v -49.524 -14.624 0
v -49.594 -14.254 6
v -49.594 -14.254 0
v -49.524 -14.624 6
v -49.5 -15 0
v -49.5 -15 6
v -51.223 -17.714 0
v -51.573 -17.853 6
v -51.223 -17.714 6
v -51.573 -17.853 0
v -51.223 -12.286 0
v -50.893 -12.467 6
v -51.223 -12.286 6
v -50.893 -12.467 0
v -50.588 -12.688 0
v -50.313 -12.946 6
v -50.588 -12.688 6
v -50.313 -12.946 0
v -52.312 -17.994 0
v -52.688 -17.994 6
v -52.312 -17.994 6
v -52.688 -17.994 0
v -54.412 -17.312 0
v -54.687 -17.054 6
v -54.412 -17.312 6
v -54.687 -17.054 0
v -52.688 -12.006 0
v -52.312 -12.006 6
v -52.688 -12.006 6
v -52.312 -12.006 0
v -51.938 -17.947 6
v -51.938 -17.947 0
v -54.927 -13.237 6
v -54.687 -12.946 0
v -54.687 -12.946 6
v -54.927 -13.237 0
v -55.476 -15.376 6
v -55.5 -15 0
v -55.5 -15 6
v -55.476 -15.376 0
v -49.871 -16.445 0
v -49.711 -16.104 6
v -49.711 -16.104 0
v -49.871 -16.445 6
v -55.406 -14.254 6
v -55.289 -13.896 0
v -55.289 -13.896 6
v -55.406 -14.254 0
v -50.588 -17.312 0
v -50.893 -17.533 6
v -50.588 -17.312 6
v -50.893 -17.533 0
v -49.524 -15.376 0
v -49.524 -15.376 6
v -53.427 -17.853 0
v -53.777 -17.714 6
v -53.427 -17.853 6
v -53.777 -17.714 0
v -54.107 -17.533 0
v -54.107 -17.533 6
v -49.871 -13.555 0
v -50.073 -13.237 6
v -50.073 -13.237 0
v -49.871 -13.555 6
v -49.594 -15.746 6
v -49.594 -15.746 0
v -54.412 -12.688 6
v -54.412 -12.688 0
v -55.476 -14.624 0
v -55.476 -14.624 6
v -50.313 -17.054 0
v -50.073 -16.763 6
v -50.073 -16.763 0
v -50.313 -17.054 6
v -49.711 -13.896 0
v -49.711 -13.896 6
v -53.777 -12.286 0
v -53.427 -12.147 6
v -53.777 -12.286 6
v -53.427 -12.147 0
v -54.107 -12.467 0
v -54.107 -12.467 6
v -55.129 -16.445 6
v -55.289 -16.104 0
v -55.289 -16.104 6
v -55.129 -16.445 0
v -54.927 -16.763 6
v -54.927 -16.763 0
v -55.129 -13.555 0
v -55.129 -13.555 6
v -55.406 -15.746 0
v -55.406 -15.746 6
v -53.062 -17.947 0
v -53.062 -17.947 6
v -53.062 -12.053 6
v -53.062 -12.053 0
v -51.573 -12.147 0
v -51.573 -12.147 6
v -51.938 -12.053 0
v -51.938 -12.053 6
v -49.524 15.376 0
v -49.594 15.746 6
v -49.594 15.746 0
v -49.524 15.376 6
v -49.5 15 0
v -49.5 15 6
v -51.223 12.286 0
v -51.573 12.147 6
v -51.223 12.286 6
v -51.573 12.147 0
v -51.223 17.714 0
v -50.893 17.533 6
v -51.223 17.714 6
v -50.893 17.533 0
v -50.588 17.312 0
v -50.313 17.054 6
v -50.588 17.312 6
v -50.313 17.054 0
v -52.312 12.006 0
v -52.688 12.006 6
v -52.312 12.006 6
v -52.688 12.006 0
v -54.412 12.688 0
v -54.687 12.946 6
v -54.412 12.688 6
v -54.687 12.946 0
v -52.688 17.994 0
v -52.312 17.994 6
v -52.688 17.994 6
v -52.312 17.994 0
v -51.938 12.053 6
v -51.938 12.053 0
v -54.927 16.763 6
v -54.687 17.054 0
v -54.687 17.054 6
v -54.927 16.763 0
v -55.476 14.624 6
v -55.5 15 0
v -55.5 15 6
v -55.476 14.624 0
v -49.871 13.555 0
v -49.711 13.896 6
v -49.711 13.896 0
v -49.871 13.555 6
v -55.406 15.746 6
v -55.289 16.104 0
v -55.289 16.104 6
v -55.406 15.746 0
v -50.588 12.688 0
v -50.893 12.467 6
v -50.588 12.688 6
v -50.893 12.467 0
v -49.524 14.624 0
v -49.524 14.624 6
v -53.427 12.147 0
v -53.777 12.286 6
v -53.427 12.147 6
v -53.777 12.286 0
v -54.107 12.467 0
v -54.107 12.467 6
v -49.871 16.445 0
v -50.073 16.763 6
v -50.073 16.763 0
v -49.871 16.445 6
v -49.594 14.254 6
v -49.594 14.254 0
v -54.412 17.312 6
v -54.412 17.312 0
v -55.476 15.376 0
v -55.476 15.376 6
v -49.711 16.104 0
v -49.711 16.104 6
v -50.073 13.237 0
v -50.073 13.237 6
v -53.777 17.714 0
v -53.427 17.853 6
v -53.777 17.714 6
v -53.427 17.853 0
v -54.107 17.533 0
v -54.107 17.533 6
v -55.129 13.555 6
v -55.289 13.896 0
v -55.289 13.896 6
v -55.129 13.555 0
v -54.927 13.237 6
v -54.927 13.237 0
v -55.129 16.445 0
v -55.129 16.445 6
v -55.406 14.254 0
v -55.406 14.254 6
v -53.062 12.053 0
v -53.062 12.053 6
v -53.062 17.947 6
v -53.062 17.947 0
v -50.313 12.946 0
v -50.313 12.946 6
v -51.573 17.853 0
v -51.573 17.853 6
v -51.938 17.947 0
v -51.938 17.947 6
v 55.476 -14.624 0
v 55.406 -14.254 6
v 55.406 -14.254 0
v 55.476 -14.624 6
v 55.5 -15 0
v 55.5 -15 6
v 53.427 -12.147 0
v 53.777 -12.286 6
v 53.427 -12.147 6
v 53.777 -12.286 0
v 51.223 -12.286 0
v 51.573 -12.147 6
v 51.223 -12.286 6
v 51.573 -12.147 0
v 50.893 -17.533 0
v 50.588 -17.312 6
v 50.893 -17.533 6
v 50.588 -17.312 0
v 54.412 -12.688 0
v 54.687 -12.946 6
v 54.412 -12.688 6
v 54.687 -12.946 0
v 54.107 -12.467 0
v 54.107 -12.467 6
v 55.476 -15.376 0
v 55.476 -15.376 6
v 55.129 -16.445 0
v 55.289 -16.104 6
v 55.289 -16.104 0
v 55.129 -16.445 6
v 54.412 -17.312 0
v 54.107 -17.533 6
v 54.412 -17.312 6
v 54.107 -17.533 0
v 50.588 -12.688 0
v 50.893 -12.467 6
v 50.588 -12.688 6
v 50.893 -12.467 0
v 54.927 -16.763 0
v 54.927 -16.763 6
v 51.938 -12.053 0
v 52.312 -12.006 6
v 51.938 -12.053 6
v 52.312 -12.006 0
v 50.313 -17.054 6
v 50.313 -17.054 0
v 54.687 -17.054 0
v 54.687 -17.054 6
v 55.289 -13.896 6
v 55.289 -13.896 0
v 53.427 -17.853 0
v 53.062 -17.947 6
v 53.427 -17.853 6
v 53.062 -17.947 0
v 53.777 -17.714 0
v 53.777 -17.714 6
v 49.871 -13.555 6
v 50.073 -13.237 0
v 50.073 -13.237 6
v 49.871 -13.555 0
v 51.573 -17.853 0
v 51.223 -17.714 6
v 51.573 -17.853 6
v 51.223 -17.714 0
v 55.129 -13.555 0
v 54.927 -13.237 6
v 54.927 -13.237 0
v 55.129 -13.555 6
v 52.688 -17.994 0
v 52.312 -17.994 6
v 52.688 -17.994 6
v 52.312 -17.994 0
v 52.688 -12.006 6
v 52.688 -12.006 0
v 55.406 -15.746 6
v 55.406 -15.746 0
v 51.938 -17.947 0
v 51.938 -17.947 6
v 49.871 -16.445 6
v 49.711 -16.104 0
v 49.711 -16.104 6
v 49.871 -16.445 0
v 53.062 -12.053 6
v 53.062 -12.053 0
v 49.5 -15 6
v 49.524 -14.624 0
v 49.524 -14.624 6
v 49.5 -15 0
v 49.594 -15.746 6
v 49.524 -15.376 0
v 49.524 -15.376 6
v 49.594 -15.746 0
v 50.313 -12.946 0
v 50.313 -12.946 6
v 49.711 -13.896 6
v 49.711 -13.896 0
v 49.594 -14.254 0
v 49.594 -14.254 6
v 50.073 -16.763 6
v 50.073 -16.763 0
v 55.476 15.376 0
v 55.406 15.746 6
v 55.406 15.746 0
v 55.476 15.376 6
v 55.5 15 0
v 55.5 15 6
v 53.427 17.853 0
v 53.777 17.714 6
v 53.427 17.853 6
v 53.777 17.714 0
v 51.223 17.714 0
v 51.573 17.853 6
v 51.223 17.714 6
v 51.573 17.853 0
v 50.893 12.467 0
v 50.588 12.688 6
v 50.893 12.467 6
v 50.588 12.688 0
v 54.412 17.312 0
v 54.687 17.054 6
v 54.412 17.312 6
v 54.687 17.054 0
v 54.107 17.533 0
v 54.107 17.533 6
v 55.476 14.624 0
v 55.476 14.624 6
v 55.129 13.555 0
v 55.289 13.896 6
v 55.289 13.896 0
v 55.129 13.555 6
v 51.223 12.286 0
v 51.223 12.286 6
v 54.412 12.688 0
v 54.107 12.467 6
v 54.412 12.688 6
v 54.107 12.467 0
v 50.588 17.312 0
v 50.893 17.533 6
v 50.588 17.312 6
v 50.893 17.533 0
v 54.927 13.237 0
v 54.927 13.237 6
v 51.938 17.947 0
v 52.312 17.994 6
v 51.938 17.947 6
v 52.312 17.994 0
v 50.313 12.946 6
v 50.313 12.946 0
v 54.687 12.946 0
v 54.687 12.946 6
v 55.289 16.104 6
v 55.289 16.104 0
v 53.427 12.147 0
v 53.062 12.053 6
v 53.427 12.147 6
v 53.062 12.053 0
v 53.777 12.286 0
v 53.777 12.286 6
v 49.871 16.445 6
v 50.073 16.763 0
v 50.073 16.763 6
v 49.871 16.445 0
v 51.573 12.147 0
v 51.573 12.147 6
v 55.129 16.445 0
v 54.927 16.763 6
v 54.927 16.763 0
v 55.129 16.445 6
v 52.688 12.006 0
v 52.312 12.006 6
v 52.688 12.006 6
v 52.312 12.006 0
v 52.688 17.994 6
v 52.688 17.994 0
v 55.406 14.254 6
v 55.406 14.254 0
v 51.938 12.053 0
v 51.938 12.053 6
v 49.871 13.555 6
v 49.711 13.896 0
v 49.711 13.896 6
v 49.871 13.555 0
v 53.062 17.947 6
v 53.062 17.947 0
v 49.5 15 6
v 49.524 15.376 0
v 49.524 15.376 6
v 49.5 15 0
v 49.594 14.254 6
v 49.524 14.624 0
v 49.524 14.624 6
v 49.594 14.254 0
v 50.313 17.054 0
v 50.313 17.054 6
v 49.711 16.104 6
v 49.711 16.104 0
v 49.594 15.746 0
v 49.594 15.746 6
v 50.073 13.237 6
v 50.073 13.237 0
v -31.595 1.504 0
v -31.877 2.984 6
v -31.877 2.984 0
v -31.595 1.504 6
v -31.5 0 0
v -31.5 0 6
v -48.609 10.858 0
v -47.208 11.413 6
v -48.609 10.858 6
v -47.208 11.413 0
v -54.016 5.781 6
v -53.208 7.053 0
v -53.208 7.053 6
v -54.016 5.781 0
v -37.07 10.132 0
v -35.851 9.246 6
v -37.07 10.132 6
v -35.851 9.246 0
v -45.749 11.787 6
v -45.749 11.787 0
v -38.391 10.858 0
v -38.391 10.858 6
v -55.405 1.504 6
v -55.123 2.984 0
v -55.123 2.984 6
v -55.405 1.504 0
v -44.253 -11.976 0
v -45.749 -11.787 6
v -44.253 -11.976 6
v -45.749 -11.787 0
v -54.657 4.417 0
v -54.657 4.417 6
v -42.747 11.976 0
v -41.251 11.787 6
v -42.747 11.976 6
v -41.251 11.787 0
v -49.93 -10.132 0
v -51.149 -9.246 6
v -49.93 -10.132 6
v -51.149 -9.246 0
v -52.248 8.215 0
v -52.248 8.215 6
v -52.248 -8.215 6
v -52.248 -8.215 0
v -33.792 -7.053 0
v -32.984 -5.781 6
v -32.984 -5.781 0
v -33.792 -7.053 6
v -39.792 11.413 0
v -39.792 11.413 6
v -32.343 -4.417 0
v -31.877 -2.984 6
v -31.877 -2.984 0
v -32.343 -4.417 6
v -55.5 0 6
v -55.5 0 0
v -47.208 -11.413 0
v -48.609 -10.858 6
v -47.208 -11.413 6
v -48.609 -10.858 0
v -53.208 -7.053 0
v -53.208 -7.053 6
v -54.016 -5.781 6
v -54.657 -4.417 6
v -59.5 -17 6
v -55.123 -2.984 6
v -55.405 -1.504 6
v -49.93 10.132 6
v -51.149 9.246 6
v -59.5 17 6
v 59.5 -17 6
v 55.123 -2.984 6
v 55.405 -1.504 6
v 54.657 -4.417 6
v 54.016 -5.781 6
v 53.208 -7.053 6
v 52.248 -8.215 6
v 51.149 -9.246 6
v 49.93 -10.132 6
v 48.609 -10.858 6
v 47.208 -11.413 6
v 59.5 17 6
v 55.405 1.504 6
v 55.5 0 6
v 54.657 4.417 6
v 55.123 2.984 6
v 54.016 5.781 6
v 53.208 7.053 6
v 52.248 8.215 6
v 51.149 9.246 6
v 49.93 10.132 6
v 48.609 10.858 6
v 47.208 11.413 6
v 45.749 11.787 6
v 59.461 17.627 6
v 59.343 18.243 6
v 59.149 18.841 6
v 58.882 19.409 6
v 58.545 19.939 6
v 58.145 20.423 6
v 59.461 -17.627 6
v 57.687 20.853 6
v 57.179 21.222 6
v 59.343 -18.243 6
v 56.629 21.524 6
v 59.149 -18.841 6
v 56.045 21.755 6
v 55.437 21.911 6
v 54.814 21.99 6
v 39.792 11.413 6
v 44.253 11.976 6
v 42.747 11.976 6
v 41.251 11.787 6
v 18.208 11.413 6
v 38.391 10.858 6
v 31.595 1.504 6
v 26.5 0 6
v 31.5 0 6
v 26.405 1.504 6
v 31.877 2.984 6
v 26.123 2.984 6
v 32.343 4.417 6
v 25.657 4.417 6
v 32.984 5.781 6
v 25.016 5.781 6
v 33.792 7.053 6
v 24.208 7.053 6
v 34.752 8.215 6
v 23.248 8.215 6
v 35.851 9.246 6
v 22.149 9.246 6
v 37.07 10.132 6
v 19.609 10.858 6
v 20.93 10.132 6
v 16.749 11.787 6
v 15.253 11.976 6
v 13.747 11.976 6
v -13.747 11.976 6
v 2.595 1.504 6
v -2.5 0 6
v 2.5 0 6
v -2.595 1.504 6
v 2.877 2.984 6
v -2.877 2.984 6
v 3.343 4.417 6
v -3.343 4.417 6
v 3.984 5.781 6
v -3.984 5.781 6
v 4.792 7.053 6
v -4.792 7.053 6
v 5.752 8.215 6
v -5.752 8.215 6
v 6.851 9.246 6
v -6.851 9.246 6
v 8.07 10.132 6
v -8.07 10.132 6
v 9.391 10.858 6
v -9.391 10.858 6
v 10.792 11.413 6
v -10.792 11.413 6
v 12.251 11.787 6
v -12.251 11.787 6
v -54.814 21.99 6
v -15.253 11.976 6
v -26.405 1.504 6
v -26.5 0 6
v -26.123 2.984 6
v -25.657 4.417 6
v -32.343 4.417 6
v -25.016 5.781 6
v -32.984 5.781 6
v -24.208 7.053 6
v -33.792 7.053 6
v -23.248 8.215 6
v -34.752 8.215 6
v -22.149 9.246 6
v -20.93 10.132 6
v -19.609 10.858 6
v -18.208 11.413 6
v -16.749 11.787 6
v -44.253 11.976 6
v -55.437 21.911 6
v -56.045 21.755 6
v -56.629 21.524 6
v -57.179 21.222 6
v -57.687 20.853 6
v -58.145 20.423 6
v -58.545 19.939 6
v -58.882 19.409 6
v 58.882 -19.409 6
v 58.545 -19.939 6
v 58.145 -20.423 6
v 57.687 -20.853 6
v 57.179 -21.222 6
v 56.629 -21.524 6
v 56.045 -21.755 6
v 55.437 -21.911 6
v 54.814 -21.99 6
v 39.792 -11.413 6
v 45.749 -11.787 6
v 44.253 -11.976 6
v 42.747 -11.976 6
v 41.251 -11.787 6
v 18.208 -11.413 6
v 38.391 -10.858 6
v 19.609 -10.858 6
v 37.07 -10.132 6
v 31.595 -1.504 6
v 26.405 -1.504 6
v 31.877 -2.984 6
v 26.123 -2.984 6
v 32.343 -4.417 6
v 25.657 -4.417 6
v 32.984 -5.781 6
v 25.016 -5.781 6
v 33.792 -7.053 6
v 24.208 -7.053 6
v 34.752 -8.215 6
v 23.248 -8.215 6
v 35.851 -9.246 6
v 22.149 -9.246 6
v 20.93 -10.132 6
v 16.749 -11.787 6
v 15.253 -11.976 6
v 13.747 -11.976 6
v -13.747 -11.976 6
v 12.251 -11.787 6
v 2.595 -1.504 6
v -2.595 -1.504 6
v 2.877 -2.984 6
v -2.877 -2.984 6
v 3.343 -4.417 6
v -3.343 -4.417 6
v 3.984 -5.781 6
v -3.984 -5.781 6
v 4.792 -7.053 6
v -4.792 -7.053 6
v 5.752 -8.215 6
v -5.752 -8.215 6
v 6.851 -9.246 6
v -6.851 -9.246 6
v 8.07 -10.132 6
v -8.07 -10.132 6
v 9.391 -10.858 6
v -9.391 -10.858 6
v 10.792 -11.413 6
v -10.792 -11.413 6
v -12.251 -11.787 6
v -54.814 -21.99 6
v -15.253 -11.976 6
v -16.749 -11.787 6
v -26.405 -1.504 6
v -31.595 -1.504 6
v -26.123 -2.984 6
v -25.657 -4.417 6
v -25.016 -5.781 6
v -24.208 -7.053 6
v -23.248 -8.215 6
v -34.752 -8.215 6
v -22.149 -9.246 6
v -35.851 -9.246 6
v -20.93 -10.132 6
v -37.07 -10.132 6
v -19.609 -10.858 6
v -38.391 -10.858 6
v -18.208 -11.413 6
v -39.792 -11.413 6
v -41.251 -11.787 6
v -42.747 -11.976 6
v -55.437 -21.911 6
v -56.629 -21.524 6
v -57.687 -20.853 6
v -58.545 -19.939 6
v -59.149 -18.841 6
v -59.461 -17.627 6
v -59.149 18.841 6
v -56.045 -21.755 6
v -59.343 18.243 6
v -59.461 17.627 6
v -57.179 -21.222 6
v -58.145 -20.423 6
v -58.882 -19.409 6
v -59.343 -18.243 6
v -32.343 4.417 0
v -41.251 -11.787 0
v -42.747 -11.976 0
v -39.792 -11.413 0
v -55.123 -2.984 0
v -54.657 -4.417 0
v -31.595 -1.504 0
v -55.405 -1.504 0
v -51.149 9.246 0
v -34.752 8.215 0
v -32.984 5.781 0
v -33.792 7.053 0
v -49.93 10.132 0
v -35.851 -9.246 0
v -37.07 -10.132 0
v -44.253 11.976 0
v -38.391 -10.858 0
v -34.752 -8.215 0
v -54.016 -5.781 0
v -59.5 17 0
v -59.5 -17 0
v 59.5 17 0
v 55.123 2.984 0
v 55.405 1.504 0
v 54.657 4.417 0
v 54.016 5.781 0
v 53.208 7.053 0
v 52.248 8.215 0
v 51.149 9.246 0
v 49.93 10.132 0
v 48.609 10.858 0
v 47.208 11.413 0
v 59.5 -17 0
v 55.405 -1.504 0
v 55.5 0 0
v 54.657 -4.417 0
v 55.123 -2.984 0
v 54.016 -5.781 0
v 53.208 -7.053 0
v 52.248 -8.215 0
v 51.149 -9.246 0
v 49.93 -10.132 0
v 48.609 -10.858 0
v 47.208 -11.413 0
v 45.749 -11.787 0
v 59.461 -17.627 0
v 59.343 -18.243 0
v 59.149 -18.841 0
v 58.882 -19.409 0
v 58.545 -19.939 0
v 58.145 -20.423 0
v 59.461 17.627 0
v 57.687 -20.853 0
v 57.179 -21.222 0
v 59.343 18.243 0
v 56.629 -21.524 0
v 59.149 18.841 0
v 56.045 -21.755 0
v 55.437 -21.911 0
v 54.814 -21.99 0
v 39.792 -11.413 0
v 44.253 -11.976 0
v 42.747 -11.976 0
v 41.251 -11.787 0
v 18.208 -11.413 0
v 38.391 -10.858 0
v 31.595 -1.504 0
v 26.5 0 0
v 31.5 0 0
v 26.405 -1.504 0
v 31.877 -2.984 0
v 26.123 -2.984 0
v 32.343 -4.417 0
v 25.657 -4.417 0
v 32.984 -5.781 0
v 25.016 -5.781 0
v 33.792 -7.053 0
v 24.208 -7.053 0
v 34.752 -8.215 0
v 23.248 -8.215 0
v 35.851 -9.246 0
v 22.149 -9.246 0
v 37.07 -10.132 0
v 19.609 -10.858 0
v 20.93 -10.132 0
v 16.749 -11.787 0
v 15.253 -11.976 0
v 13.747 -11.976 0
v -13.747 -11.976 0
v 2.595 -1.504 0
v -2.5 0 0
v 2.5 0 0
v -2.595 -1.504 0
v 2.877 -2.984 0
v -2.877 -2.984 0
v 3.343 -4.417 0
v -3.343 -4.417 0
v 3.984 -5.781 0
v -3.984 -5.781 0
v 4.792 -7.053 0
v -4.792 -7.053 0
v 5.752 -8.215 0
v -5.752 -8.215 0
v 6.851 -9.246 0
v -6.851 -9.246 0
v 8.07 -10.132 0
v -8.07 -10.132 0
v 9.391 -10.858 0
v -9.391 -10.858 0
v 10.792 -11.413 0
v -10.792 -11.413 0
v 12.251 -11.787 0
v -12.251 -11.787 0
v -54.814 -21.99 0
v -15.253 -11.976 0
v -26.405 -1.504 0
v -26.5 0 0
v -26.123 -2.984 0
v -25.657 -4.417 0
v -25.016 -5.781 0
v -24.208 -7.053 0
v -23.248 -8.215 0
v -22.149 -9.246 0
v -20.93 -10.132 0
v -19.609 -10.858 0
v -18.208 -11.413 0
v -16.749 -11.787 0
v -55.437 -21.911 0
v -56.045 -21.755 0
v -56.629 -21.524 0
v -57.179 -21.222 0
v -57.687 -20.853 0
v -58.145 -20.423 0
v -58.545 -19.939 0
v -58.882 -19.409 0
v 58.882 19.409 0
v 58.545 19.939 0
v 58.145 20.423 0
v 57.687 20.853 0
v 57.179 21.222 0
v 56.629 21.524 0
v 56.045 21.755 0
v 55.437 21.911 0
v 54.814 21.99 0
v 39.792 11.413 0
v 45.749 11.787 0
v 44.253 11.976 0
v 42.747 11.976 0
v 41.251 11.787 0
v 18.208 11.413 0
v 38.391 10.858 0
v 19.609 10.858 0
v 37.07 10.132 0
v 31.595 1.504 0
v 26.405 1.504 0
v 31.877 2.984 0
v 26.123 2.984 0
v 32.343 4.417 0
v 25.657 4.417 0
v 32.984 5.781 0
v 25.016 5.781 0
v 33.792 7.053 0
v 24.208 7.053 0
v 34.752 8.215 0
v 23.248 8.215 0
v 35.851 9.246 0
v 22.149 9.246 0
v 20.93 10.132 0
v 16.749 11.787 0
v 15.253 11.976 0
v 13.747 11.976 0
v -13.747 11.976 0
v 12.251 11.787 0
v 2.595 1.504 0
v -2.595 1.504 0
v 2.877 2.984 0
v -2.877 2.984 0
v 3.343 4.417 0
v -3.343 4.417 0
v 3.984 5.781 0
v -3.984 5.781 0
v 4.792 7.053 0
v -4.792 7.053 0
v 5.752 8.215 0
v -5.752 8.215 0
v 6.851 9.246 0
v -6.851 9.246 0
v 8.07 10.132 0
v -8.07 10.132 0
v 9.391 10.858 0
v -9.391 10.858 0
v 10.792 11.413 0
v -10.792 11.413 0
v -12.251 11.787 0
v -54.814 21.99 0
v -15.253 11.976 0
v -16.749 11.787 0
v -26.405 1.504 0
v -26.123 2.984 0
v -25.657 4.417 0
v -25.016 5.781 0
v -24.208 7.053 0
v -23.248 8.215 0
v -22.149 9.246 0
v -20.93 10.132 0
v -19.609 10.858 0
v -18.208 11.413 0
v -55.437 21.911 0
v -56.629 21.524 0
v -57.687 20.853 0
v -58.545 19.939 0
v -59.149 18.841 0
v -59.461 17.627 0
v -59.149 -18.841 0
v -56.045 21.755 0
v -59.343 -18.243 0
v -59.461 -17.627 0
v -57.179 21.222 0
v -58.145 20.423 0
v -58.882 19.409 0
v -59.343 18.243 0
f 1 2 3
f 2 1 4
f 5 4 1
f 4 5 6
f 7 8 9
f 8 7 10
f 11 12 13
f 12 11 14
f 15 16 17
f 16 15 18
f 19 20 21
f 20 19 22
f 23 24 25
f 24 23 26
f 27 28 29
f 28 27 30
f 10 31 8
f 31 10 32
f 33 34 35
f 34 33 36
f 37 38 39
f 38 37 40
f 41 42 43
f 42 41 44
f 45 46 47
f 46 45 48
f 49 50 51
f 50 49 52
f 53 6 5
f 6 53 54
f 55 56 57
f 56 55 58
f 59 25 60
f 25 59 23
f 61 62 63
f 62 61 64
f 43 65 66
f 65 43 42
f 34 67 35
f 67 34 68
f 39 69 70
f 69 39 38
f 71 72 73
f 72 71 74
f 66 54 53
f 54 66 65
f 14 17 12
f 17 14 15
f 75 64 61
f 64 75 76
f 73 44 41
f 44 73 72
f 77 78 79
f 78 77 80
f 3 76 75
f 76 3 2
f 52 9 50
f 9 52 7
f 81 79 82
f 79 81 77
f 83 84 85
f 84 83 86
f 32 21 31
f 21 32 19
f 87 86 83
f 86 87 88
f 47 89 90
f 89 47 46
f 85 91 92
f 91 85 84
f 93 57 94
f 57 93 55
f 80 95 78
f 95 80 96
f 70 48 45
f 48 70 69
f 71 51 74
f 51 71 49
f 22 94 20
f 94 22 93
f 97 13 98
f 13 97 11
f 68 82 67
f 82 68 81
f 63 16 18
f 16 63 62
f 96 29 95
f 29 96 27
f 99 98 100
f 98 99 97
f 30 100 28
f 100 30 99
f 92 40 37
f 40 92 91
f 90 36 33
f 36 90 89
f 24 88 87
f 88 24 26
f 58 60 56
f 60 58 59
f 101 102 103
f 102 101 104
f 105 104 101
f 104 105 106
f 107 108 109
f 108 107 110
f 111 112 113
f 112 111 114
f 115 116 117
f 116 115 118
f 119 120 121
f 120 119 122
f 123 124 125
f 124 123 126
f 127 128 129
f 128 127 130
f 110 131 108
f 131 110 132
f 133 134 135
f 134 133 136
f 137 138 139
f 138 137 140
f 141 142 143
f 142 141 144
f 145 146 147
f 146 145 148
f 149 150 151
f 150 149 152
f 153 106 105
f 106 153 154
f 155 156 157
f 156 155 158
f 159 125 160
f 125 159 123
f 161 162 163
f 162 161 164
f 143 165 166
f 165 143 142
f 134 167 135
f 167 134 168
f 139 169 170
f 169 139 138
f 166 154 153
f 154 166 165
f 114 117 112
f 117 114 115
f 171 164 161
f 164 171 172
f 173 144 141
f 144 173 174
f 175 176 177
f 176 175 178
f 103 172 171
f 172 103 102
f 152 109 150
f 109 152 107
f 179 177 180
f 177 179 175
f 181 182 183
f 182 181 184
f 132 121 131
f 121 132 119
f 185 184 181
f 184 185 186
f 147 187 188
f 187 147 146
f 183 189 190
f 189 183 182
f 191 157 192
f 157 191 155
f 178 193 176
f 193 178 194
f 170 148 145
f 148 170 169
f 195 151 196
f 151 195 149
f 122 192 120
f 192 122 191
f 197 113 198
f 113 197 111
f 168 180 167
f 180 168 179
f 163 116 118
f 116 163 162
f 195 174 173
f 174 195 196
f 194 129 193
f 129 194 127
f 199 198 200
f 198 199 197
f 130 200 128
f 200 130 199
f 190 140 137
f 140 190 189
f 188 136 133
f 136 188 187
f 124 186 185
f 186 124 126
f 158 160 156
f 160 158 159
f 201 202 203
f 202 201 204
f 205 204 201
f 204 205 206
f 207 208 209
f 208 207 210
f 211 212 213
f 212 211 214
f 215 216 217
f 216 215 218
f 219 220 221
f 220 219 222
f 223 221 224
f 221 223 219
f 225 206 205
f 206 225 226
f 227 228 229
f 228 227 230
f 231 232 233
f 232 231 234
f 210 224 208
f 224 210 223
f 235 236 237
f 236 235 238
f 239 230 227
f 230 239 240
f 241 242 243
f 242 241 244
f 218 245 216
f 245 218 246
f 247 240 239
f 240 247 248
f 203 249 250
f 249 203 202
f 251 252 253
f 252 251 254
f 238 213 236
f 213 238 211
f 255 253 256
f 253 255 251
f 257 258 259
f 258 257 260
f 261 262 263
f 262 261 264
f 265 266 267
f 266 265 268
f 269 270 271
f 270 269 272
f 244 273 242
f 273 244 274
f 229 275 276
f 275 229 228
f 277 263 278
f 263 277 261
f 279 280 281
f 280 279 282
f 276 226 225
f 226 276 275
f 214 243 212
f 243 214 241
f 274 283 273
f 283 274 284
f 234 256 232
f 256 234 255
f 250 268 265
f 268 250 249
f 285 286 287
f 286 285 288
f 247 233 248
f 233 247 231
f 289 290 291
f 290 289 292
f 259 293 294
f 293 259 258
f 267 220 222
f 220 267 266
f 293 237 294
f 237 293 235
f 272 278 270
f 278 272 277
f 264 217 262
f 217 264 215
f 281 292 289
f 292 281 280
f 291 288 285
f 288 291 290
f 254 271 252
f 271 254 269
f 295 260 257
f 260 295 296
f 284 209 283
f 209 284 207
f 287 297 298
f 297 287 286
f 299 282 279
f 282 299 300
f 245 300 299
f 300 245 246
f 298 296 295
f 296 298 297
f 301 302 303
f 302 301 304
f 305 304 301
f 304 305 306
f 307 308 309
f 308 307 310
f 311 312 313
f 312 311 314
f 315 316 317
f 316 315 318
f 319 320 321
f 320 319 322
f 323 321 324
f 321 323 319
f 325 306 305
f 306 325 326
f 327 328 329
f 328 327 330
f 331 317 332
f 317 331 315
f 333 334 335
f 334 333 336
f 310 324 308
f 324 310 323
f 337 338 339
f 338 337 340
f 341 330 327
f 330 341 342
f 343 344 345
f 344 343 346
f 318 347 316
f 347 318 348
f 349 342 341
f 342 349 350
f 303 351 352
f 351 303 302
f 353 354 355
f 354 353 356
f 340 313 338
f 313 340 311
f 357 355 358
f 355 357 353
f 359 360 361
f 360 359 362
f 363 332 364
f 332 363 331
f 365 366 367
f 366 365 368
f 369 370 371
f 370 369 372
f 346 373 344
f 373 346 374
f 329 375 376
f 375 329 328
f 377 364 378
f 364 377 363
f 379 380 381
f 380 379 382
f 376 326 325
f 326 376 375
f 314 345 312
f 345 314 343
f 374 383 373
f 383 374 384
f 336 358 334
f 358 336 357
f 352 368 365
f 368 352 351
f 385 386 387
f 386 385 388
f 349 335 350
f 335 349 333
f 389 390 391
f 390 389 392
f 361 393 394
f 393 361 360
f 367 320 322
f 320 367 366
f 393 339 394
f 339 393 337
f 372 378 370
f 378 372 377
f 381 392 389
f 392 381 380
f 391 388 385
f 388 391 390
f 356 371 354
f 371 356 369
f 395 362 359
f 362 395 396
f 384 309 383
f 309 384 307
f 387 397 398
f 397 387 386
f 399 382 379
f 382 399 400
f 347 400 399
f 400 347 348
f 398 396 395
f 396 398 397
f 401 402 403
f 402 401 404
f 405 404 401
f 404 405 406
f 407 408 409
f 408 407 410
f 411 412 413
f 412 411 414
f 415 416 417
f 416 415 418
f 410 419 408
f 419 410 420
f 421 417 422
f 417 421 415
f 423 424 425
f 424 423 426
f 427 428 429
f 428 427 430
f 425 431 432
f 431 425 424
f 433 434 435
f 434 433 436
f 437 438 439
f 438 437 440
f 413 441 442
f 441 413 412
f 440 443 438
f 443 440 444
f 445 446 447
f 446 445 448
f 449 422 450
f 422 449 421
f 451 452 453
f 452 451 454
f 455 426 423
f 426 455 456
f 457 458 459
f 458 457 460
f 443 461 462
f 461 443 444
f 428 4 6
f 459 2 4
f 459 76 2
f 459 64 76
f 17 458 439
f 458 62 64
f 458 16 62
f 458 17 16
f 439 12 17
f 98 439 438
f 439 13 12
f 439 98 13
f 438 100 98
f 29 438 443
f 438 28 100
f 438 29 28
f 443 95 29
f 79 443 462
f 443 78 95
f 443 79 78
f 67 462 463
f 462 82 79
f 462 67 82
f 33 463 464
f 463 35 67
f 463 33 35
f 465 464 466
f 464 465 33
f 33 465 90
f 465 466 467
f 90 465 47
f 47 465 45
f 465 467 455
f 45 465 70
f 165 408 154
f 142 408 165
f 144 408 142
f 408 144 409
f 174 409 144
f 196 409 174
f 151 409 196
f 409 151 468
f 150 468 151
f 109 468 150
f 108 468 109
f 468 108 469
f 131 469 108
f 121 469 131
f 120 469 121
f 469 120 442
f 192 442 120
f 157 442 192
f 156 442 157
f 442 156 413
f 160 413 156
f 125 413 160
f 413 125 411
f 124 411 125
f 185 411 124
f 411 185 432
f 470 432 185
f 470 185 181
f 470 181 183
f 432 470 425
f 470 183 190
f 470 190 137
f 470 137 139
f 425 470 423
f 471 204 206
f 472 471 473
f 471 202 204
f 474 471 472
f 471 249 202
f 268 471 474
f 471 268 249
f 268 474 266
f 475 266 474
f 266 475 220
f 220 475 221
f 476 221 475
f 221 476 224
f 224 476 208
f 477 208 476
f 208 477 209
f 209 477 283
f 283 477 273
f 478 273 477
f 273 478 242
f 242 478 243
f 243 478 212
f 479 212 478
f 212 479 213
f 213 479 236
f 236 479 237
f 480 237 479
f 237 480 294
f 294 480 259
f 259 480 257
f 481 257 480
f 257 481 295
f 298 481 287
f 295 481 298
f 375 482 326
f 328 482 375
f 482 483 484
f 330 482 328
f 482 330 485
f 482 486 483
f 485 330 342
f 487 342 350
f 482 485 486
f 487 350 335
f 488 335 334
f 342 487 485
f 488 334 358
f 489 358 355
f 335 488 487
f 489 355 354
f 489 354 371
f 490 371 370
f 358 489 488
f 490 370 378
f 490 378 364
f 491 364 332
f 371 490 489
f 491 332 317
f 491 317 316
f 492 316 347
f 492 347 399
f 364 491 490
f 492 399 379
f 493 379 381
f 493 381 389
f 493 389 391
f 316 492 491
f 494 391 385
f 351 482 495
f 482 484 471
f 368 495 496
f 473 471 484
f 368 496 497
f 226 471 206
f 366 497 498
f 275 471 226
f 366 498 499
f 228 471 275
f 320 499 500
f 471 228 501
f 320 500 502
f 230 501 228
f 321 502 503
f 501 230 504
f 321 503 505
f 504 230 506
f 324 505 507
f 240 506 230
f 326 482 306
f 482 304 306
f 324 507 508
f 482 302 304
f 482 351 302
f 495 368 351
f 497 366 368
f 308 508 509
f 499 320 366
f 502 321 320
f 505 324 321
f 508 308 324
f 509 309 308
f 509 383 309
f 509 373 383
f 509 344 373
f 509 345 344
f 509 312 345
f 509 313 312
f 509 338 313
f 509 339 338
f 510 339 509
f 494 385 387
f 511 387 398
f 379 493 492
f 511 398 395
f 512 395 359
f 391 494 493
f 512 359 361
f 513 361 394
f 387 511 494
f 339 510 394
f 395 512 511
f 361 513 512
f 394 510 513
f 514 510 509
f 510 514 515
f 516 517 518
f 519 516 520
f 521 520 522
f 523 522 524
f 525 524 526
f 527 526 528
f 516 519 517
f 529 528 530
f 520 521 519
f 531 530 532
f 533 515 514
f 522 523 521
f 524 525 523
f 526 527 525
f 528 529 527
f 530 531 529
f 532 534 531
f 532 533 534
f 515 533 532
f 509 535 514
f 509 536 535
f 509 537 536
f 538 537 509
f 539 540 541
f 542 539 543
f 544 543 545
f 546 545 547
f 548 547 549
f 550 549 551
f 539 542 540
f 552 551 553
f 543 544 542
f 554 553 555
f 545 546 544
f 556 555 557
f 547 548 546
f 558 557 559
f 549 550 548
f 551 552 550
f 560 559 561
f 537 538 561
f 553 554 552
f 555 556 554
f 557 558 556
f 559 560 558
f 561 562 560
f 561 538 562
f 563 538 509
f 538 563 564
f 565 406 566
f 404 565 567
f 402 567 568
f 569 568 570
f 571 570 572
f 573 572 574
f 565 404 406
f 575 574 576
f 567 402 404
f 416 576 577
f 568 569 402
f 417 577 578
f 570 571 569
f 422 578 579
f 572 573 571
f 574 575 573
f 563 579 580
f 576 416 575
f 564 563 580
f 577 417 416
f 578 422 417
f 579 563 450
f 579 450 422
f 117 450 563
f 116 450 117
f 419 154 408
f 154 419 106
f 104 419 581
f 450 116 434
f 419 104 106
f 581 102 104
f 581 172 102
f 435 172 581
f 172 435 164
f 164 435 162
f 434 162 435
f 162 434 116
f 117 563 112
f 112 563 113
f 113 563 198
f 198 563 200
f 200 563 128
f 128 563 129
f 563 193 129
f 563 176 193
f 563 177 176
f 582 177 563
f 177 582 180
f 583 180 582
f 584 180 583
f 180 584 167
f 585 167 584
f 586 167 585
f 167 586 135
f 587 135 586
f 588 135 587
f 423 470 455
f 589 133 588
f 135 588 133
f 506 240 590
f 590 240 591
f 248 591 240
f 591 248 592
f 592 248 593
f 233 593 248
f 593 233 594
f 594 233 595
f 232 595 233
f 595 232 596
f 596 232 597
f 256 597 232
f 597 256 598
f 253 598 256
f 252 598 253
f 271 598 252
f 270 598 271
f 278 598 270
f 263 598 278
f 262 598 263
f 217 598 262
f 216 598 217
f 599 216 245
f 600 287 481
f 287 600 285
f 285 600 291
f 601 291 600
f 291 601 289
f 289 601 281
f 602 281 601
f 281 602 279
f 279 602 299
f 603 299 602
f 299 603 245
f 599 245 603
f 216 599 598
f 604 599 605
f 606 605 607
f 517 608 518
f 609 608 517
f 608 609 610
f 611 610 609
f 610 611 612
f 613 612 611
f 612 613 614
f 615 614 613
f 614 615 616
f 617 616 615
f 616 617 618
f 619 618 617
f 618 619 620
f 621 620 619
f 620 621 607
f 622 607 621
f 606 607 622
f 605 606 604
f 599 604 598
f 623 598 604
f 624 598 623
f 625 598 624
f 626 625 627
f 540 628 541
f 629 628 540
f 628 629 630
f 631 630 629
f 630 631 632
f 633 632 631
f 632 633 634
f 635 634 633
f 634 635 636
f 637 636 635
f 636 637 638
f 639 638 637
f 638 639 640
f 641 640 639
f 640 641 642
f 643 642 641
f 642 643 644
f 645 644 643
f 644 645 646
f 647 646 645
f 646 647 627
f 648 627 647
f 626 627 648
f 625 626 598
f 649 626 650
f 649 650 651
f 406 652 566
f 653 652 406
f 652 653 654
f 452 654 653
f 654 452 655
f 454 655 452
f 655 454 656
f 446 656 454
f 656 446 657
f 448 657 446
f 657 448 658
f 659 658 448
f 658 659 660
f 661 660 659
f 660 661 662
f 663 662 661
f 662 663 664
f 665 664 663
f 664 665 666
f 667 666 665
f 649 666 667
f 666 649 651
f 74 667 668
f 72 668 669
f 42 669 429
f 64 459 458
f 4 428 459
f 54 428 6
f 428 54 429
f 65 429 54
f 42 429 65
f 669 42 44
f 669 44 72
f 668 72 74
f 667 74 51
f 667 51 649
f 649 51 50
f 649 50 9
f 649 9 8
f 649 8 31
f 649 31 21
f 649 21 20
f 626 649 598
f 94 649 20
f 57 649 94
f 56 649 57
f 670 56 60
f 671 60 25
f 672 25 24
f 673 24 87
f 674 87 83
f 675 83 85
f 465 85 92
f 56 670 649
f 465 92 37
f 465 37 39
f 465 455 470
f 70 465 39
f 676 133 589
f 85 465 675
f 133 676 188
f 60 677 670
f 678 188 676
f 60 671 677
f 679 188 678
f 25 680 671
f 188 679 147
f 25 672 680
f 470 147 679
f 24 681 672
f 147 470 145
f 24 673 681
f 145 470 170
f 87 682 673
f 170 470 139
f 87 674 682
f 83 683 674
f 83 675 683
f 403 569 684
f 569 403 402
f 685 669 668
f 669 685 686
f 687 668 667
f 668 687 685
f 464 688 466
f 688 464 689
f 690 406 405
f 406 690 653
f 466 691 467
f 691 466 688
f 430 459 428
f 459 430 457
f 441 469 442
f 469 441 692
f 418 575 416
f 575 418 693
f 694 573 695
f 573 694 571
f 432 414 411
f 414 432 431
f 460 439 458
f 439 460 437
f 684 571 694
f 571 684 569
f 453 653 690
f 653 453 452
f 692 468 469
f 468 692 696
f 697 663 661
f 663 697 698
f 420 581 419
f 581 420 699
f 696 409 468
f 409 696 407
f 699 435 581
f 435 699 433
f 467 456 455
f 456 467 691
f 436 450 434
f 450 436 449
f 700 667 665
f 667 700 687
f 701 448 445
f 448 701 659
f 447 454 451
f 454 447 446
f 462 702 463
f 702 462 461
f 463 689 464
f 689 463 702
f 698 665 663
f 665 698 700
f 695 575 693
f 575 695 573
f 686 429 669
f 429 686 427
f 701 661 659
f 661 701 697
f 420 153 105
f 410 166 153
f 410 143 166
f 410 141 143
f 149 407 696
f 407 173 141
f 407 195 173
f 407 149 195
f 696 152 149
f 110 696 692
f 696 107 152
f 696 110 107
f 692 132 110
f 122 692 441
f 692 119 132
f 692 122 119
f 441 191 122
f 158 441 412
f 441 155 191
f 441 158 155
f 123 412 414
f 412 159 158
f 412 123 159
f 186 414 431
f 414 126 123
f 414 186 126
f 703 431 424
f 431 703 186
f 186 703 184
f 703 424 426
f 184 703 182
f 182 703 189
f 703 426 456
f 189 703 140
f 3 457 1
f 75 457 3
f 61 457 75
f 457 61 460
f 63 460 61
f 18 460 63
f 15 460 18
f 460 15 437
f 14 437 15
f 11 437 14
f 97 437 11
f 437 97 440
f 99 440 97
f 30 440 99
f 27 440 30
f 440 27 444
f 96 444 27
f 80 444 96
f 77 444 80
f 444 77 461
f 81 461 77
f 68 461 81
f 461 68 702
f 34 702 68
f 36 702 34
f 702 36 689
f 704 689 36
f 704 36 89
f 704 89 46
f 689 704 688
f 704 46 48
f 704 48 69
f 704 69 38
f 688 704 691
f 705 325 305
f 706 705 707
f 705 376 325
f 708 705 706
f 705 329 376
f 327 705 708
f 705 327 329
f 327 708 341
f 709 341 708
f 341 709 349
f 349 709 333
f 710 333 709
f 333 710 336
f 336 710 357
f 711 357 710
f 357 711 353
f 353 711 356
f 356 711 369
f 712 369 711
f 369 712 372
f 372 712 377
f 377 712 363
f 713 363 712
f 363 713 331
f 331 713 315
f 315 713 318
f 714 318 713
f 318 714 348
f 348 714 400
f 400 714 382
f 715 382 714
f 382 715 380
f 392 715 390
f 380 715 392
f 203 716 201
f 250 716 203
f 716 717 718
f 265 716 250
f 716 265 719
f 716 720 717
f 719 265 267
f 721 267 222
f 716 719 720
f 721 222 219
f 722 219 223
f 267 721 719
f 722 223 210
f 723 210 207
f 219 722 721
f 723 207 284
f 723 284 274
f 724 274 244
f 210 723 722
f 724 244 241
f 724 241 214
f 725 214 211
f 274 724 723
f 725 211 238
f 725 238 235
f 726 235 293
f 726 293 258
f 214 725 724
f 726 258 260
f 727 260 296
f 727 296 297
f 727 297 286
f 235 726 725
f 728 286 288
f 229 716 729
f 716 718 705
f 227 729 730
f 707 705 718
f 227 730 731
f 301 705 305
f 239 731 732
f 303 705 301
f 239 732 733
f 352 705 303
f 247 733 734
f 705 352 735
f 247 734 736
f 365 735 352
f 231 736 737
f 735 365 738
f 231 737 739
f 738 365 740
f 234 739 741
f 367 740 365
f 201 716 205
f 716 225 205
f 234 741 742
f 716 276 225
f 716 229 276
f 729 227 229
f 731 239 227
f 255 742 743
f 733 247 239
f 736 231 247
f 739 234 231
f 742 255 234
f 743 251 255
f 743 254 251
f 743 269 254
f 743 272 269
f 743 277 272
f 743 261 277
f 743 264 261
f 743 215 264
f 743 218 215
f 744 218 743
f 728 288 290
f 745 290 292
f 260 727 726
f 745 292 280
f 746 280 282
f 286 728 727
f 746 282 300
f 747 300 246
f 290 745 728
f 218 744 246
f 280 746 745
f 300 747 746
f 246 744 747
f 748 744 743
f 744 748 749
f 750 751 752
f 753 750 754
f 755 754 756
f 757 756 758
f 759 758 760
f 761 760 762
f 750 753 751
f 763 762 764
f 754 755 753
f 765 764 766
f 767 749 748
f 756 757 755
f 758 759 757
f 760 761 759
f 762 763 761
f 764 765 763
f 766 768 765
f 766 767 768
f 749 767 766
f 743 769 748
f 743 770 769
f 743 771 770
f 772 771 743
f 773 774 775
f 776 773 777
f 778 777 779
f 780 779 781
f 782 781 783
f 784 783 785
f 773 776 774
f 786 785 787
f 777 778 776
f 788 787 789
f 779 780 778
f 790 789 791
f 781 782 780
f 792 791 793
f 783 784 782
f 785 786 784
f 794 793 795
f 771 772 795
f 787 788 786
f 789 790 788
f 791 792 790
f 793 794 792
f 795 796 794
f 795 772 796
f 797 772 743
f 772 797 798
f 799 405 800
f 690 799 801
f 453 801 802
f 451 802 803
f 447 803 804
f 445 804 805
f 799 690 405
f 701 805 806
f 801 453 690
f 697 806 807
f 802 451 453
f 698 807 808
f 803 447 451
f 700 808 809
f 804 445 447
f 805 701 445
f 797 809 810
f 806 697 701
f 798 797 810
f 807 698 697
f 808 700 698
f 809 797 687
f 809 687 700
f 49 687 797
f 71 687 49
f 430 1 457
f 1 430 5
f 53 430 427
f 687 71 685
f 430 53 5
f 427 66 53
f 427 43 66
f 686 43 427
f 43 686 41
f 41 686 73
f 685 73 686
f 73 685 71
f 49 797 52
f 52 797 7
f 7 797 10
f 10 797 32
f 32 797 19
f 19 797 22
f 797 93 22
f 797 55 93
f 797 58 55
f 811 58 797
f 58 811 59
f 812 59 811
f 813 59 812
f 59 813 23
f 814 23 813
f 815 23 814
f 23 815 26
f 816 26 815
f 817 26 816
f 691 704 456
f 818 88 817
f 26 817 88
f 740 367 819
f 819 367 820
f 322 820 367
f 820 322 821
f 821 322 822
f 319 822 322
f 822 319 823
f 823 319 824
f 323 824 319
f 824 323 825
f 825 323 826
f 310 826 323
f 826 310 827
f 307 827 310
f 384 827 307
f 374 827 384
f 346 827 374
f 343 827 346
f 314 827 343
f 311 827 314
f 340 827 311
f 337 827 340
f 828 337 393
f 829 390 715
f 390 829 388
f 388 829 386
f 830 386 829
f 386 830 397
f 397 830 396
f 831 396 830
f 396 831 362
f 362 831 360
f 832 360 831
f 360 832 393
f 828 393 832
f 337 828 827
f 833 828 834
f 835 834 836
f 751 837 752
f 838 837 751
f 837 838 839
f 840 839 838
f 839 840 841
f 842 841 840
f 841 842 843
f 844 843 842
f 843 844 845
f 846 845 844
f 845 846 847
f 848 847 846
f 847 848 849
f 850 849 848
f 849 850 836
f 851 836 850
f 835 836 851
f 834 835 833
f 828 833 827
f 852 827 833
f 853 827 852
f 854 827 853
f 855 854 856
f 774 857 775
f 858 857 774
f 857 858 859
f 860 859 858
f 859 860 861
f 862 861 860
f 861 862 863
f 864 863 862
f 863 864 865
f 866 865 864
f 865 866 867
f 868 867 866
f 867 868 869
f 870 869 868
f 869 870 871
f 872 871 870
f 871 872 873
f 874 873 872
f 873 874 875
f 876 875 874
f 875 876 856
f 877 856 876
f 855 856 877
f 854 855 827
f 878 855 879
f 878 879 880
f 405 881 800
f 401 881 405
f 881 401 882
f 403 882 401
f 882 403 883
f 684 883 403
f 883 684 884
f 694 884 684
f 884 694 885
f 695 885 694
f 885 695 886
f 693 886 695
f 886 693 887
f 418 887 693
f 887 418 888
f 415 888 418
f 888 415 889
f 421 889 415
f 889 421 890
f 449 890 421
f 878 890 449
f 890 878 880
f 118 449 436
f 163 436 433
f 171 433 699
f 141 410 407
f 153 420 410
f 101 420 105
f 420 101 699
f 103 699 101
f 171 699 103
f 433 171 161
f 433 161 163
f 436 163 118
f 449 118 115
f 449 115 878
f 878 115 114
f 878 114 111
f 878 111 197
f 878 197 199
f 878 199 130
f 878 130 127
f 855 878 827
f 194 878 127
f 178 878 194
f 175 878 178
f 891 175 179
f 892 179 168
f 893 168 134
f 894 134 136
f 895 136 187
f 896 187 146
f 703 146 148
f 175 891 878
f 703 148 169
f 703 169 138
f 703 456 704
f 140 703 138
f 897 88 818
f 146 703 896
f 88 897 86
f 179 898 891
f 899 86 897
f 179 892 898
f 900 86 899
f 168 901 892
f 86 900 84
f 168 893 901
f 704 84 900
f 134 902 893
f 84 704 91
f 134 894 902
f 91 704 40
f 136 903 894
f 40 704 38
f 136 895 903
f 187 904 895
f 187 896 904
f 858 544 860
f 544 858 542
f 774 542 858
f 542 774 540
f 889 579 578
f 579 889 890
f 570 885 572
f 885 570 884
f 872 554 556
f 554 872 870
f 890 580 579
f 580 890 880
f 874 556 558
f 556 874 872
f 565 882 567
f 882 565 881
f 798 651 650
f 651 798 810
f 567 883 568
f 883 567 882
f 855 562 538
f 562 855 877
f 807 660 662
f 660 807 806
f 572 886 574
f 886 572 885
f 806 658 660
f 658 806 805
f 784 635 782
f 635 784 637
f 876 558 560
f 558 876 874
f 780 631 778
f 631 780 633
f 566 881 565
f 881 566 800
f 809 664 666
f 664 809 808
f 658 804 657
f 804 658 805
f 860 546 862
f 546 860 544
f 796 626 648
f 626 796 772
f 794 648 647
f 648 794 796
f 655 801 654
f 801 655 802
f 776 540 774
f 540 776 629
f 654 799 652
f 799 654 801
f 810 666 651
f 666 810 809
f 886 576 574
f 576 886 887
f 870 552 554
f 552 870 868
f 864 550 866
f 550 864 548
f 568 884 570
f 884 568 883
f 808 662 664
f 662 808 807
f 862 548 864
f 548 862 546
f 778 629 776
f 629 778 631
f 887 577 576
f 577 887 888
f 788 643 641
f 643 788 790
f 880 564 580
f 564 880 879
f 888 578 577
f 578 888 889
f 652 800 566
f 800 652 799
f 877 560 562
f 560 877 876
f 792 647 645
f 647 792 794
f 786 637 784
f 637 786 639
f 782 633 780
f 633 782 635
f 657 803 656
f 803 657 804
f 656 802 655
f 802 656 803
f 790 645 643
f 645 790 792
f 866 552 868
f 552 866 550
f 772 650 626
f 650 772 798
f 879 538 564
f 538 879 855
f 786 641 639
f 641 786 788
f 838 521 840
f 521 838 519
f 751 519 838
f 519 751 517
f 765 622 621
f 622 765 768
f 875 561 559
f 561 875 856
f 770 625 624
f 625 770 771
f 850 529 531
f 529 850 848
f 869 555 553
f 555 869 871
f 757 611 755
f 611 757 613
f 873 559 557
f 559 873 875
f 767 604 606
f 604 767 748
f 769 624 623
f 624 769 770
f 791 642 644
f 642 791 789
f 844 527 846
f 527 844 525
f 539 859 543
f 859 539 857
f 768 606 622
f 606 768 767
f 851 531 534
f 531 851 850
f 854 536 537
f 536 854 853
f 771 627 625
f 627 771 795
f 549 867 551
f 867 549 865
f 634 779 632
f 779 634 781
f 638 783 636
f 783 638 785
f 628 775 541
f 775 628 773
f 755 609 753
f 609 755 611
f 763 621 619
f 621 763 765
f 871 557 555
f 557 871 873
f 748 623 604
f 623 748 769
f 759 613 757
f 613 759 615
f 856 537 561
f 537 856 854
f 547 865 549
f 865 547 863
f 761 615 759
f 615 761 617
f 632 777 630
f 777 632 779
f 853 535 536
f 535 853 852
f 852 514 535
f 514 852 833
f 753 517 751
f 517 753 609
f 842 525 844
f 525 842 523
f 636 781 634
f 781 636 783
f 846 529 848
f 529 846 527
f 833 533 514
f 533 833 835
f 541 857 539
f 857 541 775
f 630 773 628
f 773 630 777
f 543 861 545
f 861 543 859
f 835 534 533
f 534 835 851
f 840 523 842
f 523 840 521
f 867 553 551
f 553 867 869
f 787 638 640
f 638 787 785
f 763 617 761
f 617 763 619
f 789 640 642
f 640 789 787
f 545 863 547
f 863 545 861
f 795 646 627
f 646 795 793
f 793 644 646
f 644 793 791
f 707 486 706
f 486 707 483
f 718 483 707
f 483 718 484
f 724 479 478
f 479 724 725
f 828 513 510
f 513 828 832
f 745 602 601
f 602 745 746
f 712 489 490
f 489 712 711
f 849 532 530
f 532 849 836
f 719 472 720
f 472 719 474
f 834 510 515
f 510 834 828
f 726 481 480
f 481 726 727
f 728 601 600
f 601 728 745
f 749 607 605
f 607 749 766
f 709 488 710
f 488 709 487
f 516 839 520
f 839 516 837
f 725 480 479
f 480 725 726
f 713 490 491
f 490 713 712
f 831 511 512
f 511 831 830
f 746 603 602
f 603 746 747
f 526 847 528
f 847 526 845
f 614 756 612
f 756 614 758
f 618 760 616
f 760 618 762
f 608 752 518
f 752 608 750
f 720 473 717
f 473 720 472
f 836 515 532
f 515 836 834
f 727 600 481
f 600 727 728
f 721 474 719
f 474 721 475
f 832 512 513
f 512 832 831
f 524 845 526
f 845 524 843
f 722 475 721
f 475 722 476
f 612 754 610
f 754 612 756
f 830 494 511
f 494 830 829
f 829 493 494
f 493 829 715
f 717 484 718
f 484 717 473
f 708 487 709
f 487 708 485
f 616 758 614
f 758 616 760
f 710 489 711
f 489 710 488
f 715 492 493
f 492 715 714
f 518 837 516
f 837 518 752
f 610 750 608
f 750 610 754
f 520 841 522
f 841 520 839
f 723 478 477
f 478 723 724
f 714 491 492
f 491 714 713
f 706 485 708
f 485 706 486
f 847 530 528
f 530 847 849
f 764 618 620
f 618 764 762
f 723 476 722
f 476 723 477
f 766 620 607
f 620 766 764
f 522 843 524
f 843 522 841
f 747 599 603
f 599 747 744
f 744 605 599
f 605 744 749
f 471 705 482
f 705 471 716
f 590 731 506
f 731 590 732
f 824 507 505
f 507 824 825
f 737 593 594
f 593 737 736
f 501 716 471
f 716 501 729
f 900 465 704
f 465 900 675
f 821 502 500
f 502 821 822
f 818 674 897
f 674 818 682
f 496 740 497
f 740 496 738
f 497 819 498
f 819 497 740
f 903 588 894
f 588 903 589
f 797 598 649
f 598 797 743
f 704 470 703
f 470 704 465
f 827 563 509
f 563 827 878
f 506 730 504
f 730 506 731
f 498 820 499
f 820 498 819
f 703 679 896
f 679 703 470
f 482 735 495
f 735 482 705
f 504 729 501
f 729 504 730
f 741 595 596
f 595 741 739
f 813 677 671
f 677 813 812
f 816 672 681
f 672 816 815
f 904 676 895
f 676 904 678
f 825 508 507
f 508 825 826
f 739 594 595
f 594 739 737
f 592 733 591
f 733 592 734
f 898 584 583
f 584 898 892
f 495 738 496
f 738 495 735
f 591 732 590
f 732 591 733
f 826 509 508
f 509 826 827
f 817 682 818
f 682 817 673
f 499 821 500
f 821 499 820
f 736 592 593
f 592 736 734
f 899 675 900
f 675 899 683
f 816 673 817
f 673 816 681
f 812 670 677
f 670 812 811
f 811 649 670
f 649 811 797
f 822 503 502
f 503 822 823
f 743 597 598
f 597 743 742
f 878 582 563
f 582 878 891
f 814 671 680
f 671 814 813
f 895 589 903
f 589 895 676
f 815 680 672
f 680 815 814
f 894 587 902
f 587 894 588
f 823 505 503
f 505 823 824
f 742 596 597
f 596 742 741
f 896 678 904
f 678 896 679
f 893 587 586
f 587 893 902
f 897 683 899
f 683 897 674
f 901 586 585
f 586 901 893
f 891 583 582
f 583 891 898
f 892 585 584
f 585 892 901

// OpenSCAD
$fn = 50;


difference() {
	union() {
		hull() {
			translate(v = [-54.5000000000, 17.0000000000, 0]) {
				cylinder(h = 6, r = 5);
			}
			translate(v = [54.5000000000, 17.0000000000, 0]) {
				cylinder(h = 6, r = 5);
			}
			translate(v = [-54.5000000000, -17.0000000000, 0]) {
				cylinder(h = 6, r = 5);
			}
			translate(v = [54.5000000000, -17.0000000000, 0]) {
				cylinder(h = 6, r = 5);
			}
		}
	}
	union() {
		#translate(v = [-52.5000000000, -15.0000000000, -100.0000000000]) {
			cylinder(h = 200, r = 3.0000000000);
		}
		#translate(v = [-52.5000000000, 15.0000000000, -100.0000000000]) {
			cylinder(h = 200, r = 3.0000000000);
		}
		#translate(v = [52.5000000000, -15.0000000000, -100.0000000000]) {
			cylinder(h = 200, r = 3.0000000000);
		}
		#translate(v = [52.5000000000, 15.0000000000, -100.0000000000]) {
			cylinder(h = 200, r = 3.0000000000);
		}
		#translate(v = [-43.5000000000, 0, 0]) {
			cylinder(h = 6, r = 12.0000000000);
		}
		#translate(v = [-14.5000000000, 0, 0]) {
			cylinder(h = 6, r = 12.0000000000);
		}
		#translate(v = [14.5000000000, 0, 0]) {
			cylinder(h = 6, r = 12.0000000000);
		}
		#translate(v = [43.5000000000, 0, 0]) {
			cylinder(h = 6, r = 12.0000000000);
		}
	}
}
